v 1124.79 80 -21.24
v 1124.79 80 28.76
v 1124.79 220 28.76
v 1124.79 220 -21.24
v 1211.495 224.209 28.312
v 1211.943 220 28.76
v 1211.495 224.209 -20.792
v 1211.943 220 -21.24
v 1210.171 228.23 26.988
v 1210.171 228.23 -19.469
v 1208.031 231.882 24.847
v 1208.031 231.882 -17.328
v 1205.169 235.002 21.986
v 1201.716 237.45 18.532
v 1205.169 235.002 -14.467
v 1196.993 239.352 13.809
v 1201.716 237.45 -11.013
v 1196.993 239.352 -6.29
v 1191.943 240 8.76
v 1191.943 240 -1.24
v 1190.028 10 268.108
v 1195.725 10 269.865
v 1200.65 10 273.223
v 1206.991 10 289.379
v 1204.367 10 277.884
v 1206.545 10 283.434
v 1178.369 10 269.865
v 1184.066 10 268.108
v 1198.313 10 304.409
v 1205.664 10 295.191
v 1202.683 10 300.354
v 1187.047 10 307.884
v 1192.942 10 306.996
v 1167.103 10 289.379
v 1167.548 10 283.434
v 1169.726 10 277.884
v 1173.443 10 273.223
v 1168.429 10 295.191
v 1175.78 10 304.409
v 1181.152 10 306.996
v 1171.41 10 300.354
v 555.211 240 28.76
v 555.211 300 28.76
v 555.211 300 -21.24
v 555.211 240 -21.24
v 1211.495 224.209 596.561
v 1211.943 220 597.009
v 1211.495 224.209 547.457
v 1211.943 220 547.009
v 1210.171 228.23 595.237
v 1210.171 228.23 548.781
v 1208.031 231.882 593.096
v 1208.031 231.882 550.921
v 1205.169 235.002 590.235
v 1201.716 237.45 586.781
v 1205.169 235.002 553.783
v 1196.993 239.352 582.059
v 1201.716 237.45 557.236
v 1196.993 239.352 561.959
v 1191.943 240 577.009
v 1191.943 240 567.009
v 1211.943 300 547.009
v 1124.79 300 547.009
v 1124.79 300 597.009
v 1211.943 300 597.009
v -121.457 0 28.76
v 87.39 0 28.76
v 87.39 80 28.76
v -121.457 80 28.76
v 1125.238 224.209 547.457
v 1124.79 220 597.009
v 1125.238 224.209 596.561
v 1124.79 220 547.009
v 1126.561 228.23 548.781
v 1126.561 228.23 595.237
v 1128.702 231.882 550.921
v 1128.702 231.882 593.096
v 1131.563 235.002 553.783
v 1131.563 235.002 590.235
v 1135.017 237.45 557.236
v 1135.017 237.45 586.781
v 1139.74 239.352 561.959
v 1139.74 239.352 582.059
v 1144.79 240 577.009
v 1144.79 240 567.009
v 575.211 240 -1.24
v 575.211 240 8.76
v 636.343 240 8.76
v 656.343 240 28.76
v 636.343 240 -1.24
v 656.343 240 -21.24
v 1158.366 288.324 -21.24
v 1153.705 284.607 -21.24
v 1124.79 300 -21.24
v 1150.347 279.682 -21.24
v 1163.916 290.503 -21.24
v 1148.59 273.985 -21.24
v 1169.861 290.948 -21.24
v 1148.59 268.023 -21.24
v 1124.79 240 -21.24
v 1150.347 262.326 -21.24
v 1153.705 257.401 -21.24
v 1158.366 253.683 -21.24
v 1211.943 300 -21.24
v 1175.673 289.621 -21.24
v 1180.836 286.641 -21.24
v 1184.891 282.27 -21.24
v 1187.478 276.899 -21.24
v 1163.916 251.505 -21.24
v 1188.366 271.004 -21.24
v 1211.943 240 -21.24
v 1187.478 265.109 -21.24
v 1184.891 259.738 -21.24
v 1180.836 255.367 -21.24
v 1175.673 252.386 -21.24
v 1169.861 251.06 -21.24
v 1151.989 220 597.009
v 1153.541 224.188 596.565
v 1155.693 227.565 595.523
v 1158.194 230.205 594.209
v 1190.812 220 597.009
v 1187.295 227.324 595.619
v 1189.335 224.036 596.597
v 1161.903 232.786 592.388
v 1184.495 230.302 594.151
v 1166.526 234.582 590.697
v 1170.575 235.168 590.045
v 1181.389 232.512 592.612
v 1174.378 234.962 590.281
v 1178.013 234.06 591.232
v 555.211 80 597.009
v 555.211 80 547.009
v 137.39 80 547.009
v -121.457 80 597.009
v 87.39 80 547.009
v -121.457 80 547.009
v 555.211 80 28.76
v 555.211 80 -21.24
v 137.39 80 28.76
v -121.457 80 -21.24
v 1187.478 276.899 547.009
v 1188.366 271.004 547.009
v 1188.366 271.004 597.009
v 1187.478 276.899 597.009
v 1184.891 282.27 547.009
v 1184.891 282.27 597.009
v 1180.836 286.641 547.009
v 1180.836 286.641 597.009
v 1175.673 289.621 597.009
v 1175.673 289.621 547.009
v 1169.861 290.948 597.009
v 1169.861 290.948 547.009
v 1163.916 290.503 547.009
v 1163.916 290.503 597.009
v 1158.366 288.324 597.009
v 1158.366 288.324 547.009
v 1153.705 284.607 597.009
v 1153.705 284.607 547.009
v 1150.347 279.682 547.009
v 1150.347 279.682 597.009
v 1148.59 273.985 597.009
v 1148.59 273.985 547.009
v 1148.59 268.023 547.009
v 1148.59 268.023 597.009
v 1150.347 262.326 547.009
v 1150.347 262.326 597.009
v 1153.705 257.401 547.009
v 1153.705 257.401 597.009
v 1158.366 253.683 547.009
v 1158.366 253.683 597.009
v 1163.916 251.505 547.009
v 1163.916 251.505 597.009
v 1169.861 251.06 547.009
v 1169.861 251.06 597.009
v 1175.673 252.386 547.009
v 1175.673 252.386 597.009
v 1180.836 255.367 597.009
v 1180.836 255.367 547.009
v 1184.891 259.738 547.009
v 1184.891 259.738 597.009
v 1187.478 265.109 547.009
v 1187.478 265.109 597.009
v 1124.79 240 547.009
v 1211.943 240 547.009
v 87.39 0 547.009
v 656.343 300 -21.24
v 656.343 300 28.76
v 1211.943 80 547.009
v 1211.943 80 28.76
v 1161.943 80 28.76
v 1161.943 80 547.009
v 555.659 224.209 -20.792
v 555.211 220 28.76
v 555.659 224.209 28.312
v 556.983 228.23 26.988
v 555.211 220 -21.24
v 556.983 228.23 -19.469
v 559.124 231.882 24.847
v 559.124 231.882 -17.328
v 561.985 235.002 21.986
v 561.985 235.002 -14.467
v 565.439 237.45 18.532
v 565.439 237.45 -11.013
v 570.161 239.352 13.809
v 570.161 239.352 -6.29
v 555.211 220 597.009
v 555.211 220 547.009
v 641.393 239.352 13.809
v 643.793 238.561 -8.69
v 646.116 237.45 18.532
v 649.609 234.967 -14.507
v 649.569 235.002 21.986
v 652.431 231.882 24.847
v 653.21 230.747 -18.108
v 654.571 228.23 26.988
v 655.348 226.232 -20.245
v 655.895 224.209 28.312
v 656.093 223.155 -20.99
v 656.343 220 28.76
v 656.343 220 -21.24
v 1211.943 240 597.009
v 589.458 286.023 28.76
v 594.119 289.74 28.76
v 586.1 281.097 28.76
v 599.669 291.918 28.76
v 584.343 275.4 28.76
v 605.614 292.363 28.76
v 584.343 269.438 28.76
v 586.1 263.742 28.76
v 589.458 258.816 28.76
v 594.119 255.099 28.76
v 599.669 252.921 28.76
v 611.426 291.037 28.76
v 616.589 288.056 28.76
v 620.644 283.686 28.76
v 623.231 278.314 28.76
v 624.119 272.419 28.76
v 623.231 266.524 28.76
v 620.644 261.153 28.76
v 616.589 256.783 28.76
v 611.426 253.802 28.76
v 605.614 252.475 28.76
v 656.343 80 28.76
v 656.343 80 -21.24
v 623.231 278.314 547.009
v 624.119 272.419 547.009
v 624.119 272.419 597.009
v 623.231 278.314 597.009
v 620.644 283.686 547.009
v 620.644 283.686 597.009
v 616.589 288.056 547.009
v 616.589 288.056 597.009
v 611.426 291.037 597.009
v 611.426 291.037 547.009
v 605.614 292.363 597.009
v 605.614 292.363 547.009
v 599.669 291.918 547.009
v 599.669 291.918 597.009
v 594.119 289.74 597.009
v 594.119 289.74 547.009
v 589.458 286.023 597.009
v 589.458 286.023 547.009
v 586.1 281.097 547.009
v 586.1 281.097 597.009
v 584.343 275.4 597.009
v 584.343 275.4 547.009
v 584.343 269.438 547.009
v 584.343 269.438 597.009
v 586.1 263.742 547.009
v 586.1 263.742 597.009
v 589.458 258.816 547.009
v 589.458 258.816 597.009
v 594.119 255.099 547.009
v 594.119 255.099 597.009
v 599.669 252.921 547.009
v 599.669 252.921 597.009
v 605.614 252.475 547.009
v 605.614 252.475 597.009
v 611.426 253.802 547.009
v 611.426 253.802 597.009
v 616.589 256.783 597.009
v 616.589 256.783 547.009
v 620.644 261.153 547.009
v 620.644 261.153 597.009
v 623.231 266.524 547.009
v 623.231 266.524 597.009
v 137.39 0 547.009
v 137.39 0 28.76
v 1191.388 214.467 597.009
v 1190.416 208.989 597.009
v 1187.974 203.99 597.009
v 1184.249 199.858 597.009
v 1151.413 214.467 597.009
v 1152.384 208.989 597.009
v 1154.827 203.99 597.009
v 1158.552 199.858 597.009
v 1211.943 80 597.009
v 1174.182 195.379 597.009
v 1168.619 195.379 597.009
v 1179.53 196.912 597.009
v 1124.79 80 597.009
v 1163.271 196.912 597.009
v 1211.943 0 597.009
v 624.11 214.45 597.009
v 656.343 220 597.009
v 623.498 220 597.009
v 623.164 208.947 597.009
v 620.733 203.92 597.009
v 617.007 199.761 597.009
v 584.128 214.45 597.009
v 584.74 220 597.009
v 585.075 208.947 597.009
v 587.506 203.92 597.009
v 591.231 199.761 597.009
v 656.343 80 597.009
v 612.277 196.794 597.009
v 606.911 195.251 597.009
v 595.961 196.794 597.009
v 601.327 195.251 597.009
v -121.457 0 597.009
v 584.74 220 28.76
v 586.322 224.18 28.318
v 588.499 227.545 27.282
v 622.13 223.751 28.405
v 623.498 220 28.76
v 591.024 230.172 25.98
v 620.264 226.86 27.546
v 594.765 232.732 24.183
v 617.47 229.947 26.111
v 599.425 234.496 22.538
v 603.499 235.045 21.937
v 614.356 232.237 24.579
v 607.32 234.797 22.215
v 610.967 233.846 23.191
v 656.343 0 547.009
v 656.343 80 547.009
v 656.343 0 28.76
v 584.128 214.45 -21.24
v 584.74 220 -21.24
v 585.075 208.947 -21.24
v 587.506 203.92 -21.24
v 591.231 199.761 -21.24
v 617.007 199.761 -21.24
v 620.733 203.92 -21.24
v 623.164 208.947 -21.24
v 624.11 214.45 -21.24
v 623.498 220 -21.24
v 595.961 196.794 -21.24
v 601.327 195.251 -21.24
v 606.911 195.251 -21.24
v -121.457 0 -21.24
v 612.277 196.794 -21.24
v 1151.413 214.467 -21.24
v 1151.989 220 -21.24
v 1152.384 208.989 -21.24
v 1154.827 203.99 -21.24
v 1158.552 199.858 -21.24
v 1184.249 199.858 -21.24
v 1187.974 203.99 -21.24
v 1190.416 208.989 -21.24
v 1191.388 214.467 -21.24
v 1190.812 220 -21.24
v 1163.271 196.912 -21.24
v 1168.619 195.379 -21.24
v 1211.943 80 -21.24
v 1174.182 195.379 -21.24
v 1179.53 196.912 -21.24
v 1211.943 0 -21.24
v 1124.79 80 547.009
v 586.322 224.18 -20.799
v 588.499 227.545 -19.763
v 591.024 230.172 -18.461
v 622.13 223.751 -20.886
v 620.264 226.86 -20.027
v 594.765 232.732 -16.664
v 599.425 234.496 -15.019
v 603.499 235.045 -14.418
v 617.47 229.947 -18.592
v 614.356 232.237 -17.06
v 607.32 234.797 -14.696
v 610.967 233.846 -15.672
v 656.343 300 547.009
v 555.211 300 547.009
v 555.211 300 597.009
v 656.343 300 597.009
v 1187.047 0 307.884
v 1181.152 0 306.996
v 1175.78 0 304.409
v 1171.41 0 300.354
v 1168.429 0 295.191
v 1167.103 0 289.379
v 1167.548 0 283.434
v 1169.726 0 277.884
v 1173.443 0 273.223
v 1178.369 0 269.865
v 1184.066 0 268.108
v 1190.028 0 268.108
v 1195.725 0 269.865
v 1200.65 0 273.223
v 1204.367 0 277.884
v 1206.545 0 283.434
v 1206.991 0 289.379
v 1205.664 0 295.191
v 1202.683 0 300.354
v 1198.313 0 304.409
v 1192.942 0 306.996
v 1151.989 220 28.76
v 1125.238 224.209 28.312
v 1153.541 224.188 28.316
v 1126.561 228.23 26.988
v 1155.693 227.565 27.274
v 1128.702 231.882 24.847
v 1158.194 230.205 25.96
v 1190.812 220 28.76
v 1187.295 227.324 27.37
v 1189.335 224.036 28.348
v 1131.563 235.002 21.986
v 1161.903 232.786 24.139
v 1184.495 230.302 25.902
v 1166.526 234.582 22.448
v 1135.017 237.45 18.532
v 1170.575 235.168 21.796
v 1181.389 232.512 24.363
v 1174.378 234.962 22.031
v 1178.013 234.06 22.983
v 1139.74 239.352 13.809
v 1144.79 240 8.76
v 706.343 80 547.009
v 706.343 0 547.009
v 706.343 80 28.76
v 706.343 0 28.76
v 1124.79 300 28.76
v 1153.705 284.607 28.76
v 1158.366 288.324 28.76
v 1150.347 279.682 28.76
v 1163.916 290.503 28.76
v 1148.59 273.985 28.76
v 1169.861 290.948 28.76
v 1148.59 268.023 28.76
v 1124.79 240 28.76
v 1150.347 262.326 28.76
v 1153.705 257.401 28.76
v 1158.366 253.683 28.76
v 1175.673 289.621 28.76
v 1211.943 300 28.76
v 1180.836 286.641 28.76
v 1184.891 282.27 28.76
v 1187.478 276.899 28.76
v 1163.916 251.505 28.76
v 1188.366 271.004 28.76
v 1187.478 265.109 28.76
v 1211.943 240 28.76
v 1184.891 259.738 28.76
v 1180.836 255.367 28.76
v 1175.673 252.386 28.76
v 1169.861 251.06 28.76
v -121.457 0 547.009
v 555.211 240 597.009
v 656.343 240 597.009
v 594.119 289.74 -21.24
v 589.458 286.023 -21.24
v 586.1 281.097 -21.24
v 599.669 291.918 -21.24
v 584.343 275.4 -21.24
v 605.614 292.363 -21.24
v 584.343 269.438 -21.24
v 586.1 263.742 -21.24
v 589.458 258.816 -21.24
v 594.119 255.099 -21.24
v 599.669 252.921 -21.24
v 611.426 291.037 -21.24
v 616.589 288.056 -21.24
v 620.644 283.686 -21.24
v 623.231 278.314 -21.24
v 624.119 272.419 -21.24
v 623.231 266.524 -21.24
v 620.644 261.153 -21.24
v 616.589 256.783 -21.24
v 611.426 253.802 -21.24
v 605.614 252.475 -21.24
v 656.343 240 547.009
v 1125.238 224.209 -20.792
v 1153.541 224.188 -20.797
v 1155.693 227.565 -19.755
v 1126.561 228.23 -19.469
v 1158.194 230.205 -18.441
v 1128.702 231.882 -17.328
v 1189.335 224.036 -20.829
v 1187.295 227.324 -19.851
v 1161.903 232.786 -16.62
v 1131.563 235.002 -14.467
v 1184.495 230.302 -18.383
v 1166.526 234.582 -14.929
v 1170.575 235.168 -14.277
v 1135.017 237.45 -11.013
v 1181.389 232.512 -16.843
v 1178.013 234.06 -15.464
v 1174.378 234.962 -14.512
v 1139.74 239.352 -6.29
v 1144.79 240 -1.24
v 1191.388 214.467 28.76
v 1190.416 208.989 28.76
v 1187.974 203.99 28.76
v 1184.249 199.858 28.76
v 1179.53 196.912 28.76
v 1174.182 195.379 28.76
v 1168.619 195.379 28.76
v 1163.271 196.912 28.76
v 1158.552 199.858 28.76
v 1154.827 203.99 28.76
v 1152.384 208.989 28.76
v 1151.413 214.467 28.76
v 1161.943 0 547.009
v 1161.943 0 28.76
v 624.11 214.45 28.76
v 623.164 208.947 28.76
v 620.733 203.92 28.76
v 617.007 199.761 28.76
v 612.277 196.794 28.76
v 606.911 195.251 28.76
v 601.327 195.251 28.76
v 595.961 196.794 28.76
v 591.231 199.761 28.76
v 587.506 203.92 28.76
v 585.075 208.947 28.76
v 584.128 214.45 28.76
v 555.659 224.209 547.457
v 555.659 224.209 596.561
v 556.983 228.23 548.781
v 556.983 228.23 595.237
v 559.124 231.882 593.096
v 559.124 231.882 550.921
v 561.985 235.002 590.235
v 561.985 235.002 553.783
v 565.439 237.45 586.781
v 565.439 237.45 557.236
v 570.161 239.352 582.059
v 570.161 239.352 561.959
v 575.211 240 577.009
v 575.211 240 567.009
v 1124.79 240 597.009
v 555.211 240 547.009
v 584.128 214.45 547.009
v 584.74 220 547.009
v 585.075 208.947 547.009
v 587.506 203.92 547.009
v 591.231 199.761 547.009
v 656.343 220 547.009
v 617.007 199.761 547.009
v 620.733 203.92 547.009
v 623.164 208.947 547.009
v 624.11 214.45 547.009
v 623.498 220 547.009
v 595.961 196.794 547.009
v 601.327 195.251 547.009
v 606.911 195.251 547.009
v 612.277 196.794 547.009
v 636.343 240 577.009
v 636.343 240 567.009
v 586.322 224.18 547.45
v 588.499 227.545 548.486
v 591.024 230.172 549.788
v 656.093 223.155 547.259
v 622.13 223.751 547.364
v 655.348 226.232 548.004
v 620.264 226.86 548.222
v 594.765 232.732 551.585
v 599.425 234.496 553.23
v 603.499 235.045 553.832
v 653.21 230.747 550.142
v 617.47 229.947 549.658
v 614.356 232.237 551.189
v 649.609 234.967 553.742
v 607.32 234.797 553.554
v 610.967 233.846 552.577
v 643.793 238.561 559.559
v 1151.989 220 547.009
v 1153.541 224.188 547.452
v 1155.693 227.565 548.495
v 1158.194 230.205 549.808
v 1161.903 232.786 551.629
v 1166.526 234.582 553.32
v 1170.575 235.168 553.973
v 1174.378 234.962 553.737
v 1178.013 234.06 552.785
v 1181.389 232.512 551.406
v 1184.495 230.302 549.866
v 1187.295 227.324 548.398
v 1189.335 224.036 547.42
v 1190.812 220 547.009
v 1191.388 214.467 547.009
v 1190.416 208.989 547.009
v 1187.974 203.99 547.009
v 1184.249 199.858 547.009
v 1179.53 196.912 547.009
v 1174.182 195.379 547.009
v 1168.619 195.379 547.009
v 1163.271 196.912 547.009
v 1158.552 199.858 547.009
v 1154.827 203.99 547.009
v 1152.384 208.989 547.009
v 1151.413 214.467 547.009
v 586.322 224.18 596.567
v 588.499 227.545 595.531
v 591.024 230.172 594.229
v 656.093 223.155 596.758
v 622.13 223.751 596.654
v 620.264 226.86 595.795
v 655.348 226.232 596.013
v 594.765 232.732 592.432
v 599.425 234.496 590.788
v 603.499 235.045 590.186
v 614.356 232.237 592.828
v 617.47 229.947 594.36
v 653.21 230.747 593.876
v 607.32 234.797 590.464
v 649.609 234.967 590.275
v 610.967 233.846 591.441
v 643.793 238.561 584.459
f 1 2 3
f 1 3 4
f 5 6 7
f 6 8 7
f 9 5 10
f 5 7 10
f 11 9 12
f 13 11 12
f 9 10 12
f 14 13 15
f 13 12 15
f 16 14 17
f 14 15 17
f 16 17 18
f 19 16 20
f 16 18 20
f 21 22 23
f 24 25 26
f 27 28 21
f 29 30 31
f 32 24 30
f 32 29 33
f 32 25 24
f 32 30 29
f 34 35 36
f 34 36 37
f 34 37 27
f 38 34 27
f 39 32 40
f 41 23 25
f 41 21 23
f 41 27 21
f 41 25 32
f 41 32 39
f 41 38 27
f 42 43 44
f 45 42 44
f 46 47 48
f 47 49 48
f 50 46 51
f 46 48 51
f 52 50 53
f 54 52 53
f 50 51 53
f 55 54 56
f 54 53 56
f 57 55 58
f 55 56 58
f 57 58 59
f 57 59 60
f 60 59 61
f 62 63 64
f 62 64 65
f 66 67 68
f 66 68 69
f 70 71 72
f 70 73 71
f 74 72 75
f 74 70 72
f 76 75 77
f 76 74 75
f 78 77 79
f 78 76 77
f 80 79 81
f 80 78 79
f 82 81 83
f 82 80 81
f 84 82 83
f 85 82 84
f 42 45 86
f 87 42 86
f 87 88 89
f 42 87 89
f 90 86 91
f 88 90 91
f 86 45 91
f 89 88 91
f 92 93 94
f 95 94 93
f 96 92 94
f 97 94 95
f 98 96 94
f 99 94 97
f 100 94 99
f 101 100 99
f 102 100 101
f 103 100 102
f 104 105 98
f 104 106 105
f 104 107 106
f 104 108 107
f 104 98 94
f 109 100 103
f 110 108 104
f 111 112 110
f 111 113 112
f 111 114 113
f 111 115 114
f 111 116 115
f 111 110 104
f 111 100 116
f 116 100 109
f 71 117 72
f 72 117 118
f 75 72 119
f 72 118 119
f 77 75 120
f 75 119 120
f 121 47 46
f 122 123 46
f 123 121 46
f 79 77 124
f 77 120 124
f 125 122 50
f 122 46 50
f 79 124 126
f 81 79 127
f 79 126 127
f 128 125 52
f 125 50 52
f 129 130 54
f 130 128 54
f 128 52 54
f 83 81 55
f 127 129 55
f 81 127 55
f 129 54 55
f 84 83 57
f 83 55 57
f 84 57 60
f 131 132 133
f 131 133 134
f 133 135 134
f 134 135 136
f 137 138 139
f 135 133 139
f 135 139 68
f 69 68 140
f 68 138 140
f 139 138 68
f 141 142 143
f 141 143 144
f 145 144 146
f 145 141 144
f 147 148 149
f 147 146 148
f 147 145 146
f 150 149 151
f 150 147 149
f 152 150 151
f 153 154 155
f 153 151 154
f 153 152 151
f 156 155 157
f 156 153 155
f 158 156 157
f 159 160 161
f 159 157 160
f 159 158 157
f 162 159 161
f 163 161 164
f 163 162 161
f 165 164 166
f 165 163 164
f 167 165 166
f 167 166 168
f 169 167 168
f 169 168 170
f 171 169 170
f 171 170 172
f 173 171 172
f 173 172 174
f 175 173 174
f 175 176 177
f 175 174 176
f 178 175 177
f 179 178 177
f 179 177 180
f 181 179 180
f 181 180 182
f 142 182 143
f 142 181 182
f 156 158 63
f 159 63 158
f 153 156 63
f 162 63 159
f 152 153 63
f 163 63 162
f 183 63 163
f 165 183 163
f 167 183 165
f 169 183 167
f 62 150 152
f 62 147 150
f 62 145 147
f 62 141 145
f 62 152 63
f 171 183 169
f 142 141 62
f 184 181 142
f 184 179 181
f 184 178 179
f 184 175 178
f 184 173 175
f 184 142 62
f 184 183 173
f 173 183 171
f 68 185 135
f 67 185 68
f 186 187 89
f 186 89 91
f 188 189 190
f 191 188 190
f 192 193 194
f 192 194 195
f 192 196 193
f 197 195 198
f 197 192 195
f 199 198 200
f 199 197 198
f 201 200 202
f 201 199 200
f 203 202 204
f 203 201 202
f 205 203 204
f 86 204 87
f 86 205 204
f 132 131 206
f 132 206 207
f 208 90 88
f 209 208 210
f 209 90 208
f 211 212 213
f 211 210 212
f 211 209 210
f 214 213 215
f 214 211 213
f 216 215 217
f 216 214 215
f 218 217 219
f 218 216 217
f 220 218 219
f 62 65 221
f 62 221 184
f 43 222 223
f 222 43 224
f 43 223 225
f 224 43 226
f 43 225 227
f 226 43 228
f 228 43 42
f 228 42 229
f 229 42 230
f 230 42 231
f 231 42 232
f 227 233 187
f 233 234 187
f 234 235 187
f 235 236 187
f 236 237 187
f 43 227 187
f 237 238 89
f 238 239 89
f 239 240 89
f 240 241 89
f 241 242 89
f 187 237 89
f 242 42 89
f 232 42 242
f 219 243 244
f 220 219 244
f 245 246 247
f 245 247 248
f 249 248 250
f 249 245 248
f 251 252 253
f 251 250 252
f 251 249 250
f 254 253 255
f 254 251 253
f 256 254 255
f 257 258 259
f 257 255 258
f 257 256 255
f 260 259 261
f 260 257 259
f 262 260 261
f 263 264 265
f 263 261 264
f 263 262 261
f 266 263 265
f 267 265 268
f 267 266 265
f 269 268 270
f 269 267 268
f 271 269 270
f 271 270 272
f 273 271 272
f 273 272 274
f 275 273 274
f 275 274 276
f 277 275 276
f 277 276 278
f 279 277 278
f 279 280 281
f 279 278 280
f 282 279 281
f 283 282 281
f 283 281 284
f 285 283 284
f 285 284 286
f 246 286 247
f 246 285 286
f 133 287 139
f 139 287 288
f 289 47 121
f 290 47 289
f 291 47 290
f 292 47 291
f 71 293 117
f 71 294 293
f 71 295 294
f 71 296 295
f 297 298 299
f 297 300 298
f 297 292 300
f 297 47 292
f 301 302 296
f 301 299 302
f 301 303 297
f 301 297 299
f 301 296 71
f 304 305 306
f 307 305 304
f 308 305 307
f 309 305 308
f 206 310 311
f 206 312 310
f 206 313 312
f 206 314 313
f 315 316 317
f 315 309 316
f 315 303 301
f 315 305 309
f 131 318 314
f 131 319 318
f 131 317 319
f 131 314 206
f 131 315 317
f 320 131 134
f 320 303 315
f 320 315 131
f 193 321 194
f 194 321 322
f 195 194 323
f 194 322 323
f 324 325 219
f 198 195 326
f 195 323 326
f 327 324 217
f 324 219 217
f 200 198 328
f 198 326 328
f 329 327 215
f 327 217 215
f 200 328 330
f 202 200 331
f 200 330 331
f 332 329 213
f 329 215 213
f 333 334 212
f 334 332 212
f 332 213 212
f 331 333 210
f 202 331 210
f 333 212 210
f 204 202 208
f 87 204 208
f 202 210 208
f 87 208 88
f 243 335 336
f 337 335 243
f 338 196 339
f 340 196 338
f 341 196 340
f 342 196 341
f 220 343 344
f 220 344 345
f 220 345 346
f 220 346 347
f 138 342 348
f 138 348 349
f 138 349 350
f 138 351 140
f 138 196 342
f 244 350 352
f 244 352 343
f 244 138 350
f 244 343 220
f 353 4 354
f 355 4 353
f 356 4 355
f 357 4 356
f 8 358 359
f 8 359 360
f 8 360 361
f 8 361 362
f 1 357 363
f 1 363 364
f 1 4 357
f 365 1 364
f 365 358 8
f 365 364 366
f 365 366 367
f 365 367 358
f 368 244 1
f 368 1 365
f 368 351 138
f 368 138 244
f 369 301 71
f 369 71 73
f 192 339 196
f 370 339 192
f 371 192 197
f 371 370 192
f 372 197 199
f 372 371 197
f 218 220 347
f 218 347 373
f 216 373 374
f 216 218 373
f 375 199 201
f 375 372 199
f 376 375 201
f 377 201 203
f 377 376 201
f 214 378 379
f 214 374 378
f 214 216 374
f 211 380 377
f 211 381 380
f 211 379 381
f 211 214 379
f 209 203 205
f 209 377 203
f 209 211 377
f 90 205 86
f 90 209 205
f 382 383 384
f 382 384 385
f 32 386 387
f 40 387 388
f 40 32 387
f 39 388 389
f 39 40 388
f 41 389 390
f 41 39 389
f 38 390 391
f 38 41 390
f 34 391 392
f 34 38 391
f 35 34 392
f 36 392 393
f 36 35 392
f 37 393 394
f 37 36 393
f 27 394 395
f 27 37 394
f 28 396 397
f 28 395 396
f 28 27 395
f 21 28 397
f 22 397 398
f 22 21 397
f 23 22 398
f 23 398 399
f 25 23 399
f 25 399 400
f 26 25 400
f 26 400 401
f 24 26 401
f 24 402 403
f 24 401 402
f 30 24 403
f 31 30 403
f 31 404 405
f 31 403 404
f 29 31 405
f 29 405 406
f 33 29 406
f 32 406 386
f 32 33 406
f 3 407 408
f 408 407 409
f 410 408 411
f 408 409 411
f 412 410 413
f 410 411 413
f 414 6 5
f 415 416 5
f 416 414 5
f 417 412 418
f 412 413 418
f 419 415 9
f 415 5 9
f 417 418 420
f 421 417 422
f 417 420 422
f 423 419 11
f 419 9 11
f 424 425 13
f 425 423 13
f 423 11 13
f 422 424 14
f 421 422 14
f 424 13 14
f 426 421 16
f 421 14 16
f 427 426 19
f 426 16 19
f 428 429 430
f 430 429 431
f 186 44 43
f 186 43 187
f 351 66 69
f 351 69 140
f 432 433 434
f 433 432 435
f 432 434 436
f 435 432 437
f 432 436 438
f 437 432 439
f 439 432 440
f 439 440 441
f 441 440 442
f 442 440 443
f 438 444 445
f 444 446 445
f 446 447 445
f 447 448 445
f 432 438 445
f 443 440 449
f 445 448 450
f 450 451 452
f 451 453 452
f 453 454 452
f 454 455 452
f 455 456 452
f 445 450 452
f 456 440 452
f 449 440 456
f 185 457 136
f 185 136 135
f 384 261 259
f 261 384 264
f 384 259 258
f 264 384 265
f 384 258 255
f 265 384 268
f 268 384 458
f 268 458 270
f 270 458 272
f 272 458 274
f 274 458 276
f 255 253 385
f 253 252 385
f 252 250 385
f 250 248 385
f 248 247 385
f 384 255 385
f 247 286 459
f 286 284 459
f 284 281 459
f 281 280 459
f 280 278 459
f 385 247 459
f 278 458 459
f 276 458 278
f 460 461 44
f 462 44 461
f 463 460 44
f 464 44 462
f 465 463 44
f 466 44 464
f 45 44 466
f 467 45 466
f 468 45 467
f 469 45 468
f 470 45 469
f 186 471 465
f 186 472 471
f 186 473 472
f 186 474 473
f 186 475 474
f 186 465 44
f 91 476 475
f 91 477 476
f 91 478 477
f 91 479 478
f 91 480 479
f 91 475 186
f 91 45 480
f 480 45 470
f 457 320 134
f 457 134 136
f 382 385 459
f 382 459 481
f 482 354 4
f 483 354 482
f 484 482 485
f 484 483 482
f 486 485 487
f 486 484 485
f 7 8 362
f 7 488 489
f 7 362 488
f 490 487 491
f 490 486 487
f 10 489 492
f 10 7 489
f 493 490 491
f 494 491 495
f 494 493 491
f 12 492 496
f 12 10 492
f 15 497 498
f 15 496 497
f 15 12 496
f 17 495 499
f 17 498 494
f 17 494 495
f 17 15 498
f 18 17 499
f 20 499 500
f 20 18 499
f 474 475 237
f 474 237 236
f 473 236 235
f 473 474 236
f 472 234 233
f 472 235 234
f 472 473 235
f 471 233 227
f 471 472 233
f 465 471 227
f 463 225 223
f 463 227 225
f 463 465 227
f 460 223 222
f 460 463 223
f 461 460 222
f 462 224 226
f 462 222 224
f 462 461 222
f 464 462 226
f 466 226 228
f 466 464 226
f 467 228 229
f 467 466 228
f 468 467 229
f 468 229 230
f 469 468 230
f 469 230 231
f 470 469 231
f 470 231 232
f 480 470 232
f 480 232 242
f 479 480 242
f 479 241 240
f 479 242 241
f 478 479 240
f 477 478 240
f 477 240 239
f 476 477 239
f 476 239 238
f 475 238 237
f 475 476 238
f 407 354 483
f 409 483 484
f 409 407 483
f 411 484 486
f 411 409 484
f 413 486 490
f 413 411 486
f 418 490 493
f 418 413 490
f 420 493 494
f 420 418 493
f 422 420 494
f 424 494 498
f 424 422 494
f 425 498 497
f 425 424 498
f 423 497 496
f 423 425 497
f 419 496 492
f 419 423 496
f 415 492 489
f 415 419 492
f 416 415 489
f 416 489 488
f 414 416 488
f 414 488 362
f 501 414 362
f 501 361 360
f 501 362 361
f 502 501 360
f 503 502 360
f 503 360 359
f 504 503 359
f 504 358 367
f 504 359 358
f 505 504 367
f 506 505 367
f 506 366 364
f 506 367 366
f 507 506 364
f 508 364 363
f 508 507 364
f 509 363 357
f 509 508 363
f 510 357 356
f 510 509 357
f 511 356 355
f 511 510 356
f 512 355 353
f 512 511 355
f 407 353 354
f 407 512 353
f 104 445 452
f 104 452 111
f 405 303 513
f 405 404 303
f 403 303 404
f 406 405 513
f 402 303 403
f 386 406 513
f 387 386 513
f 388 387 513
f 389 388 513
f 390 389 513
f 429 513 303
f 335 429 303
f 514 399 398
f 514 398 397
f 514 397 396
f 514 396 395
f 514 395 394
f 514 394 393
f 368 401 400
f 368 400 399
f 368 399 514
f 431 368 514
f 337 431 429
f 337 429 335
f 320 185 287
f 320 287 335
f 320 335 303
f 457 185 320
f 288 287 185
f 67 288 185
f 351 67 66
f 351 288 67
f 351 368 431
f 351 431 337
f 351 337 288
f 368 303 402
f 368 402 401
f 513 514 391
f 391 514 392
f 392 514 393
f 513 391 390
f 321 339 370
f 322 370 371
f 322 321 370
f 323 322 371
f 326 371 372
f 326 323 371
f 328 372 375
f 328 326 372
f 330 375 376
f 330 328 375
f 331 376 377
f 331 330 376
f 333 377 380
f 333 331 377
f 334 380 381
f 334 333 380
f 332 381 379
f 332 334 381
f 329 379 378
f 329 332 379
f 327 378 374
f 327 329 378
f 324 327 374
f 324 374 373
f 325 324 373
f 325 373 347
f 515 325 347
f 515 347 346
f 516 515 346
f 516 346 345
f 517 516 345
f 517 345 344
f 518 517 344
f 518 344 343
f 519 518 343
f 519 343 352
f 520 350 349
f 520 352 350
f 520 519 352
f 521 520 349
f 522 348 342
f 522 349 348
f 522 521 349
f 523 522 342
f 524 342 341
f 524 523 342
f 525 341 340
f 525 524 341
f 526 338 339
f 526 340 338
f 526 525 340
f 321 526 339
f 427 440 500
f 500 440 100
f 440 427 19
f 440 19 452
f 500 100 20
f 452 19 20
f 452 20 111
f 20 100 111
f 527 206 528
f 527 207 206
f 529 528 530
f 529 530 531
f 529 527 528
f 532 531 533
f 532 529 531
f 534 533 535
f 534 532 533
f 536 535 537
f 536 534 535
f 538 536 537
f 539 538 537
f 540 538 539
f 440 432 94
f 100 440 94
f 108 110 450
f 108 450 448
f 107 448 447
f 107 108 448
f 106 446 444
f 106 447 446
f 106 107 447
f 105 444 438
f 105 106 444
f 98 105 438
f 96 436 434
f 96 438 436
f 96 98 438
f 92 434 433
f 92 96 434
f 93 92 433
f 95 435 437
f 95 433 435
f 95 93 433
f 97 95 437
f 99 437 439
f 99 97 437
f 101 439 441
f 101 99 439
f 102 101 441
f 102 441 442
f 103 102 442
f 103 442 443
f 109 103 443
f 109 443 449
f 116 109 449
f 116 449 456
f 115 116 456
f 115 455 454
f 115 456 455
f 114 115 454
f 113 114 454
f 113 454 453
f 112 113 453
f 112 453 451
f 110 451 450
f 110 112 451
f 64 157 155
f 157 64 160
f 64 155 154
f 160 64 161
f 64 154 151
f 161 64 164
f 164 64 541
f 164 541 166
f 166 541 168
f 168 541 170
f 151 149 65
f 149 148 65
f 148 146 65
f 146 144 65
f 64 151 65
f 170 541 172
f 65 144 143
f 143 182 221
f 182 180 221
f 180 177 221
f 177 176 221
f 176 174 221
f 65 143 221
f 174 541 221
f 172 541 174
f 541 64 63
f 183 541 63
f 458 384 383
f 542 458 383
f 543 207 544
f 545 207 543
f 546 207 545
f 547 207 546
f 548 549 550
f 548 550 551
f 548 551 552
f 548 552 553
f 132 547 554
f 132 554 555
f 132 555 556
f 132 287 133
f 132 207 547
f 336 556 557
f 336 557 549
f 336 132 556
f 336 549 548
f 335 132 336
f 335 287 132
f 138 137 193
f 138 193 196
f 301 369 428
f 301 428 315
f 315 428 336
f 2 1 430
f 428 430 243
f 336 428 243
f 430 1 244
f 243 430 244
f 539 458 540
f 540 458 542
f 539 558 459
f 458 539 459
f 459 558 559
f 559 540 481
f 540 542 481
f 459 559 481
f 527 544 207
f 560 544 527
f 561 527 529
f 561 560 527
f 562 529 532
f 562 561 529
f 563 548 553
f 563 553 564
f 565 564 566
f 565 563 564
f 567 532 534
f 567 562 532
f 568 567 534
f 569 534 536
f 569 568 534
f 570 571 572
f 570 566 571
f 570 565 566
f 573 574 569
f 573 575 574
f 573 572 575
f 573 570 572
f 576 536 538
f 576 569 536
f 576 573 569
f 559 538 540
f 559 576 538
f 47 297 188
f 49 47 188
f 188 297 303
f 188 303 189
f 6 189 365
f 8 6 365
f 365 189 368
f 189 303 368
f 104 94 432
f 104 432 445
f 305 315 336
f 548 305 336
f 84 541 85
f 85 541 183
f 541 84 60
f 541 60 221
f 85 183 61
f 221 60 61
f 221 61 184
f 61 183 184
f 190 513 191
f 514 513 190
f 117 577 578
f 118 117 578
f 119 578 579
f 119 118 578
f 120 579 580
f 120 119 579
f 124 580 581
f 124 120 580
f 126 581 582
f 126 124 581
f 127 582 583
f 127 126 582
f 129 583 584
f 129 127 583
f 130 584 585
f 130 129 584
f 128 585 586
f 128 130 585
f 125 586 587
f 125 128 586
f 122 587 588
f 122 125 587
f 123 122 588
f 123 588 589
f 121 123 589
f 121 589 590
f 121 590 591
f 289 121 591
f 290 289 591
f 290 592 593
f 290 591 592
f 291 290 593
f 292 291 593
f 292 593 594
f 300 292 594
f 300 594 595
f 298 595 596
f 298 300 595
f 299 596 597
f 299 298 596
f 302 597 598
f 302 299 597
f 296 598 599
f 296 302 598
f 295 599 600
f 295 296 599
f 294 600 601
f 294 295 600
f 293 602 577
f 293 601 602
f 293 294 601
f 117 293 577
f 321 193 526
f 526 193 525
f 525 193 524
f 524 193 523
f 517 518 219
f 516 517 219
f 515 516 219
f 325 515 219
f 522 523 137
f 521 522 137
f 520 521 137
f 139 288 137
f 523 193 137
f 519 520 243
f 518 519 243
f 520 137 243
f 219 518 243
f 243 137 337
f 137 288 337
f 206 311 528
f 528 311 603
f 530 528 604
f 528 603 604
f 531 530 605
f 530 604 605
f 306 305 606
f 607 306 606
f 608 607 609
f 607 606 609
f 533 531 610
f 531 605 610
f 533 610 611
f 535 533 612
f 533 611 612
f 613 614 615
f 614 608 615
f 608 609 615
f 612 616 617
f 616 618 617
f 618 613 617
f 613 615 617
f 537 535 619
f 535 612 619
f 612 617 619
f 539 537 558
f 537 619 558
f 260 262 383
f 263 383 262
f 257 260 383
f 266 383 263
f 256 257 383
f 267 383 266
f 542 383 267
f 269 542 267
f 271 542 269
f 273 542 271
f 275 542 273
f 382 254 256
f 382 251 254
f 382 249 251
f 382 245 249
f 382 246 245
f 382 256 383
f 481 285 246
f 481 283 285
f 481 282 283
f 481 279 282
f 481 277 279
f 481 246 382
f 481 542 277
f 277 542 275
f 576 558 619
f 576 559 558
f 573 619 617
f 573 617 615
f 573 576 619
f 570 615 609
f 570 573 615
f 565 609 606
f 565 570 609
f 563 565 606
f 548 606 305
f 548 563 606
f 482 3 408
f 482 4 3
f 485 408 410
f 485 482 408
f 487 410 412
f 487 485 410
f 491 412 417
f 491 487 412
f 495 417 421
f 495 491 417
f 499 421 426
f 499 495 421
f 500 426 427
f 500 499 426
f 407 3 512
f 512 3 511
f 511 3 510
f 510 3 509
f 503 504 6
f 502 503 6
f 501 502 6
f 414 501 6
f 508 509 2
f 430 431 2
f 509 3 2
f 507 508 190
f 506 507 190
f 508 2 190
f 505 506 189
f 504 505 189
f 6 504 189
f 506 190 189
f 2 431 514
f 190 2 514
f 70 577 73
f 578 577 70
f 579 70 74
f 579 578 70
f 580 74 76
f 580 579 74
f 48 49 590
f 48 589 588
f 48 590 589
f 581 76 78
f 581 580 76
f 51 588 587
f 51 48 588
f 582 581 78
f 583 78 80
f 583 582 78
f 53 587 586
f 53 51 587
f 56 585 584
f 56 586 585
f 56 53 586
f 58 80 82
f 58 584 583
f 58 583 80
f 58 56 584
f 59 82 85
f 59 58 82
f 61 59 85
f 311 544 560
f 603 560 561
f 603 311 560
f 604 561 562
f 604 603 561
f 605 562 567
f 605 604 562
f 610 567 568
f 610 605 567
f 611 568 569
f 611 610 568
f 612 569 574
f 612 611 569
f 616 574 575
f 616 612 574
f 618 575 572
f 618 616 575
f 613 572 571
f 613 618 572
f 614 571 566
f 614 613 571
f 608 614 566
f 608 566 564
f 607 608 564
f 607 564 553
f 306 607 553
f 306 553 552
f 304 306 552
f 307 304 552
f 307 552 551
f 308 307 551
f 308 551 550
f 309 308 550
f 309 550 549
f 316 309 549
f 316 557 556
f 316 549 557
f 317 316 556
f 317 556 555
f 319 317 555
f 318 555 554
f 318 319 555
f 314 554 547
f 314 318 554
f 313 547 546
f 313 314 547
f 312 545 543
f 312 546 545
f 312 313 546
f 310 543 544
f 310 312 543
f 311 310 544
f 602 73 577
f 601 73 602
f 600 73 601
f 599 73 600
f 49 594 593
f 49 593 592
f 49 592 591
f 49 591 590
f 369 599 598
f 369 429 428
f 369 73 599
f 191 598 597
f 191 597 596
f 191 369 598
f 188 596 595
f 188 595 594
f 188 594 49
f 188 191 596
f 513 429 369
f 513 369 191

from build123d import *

# Parameters (mm, degrees)
SKETCH1_W               = 518.953439809
SKETCH1_H               = 518.249184403
SKETCH1_W_2             = 455.6
BOSS_EXTRUDE3_DEPTH     = 80
SKETCH2_W               = 101.131848524
SKETCH2_H               = 50
SKETCH2_W_2             = 87.153604081
BOSS_EXTRUDE4_DEPTH     = 160
FILLET1_R               = 20
CUT_EXTRUDE3_DEPTH      = 1373.160931607
CUT_EXTRUDE3_DEPTH_BACK = 10
SKETCH5_R               = 20
CUT_EXTRUDE4_DEPTH      = 1382.534741242
CUT_EXTRUDE4_DEPTH_BACK = 1382.534741242
SKETCH3_R               = 20
CUT_EXTRUDE5_DEPTH      = 1382.534741304
CUT_EXTRUDE5_DEPTH_BACK = 1382.534741304
SKETCH4_R               = 20
SKETCH6_W               = 101.131848524
SKETCH6_H               = 50
BOSS_EXTRUDE5_DEPTH     = 60
CUT_EXTRUDE6_DEPTH      = 1394.211484888
CUT_EXTRUDE6_DEPTH_BACK = 1394.211484888
SKETCH7_R               = 20
SKETCH8_W               = 87.153604081
SKETCH8_H               = 50
BOSS_EXTRUDE6_DEPTH     = 60
CUT_EXTRUDE7_DEPTH      = 1394.211484888
CUT_EXTRUDE7_DEPTH_BACK = 1394.211484888
SKETCH9_R               = 20


with BuildPart() as part:
    # Sketch1 → Boss-Extrude3 (new body)
    with BuildSketch(Plane(origin=(0, 0, 0), x_dir=(1, 0, 0), z_dir=(0, 1, 0))):
        Polygon((-121.456854781, 21.240444949), (1211.943145219, 21.240444949), (1211.943145219, -50.701004169), (1211.943145219, -568.950188572), (1211.943145219, -597.008739454), (-121.456854781, -597.008739454), (-121.456854781, -547.008739454), (87.38970541, -547.008739454), (87.38970541, -28.759555051), (-121.456854781, -28.759555051), align=None)
        with Locations((396.866425315, -287.884147253)):
            Rectangle(SKETCH1_W, SKETCH1_H, mode=Mode.SUBTRACT)
        with Locations((934.143145219, -287.884147253)):
            Rectangle(SKETCH1_W_2, SKETCH1_H, mode=Mode.SUBTRACT)
    extrude(amount=BOSS_EXTRUDE3_DEPTH)

    # Sketch2 → Boss-Extrude4 (add)
    with BuildSketch(Plane(origin=(0, 80, 0), x_dir=(1, 0, 0), z_dir=(0, 1, 0))):
        with Locations((605.777220957, -3.759555051)):
            Rectangle(SKETCH2_W, SKETCH2_H)
        with Locations((1168.366343179, -3.759555051)):
            Rectangle(SKETCH2_W_2, SKETCH2_H)
        with Locations((605.777220957, -572.008739454)):
            Rectangle(SKETCH2_W, SKETCH2_H)
        with Locations((1168.366343179, -572.008739454)):
            Rectangle(SKETCH2_W_2, SKETCH2_H)
    extrude(amount=BOSS_EXTRUDE4_DEPTH)

    # Fillet1
    fillet1_edges = [part.edges().sort_by_distance(p)[0] for p in [
        (656.343145219, 240, 572.008739454),
        (605.777220957, 240, 547.008739454),
        (555.211296695, 240, 572.008739454),
        (605.777220957, 240, 597.008739454),
        (1124.789541138, 240, 3.759555051),
        (1168.366343178, 240, 28.759555051),
        (1211.943145219, 240, 3.759555051),
        (1168.366343178, 240, -21.240444949),
        (1124.789541138, 240, 572.008739454),
        (1168.366343178, 240, 597.008739454),
        (1211.943145219, 240, 572.008739454),
        (1168.366343178, 240, 547.008739454),
        (555.211296695, 240, 3.759555051),
        (605.777220957, 240, 28.759555051),
        (656.343145219, 240, 3.759555051),
        (605.777220957, 240, -21.240444949),
    ]]
    fillet(fillet1_edges, radius=FILLET1_R)

    # Sketch5 → Cut-Extrude3 (cut, two sides: drawn at the far end of the back side and taken through both)
    with BuildSketch(Plane(origin=(0, 0, 0), x_dir=(-1, 0, 0), z_dir=(0, -1, 0)).offset(-CUT_EXTRUDE3_DEPTH_BACK)):
        with Locations(Location((-1187.046867592, -287.884147253, 0), (0, 0, 270))):
            Circle(SKETCH5_R)
    extrude(amount=CUT_EXTRUDE3_DEPTH + CUT_EXTRUDE3_DEPTH_BACK, mode=Mode.SUBTRACT)

    # Sketch3 → Cut-Extrude4 (cut, two sides: drawn at the far end of the back side and taken through both)
    with BuildSketch(Plane(origin=(0, 0, -21.240444949), x_dir=(-1, 0, 0), z_dir=(0, 0, -1)).offset(-CUT_EXTRUDE4_DEPTH_BACK)):
        with Locations(Location((-604.119324359, 215.055032995, 0), (0, 0, 14.314743265))):
            Circle(SKETCH3_R)
    extrude(amount=CUT_EXTRUDE4_DEPTH + CUT_EXTRUDE4_DEPTH_BACK, mode=Mode.SUBTRACT)

    # Sketch4 → Cut-Extrude5 (cut, two sides: drawn at the far end of the back side and taken through both)
    with BuildSketch(Plane(origin=(0, 0, -21.240444949), x_dir=(-1, 0, 0), z_dir=(0, 0, -1)).offset(-CUT_EXTRUDE5_DEPTH_BACK)):
        with Locations(Location((-1171.400402377, 215.184793276, 0), (0, 0, 13.931420355))):
            Circle(SKETCH4_R)
    extrude(amount=CUT_EXTRUDE5_DEPTH + CUT_EXTRUDE5_DEPTH_BACK, mode=Mode.SUBTRACT)

    # Sketch6 → Boss-Extrude5 (add)
    with BuildSketch(Plane(origin=(0, 240, 0), x_dir=(1, 0, 0), z_dir=(0, 1, 0))):
        with Locations((605.777220957, -3.759555051)):
            Rectangle(SKETCH6_W, SKETCH6_H)
        with Locations((605.777220957, -572.008739454)):
            Rectangle(SKETCH6_W, SKETCH6_H)
    extrude(amount=BOSS_EXTRUDE5_DEPTH)

    # Sketch7 → Cut-Extrude6 (cut, two sides: drawn at the far end of the back side and taken through both)
    with BuildSketch(Plane.XY.offset(597.008739454).offset(-CUT_EXTRUDE6_DEPTH_BACK)):
        with Locations((604.119324359, 272.419198887)):
            Circle(SKETCH7_R)
    extrude(amount=CUT_EXTRUDE6_DEPTH + CUT_EXTRUDE6_DEPTH_BACK, mode=Mode.SUBTRACT)

    # Sketch8 → Boss-Extrude6 (add)
    with BuildSketch(Plane(origin=(0, 240, 0), x_dir=(1, 0, 0), z_dir=(0, 1, 0))):
        with Locations((1168.366343179, -572.008739454)):
            Rectangle(SKETCH8_W, SKETCH8_H)
        with Locations((1168.366343179, -3.759555051)):
            Rectangle(SKETCH8_W, SKETCH8_H)
    extrude(amount=BOSS_EXTRUDE6_DEPTH)

    # Sketch9 → Cut-Extrude7 (cut, two sides: drawn at the far end of the back side and taken through both)
    with BuildSketch(Plane.XY.offset(597.008739454).offset(-CUT_EXTRUDE7_DEPTH_BACK)):
        with Locations((1168.366343178, 271.00396048)):
            Circle(SKETCH9_R)
    extrude(amount=CUT_EXTRUDE7_DEPTH + CUT_EXTRUDE7_DEPTH_BACK, mode=Mode.SUBTRACT)


solid = part.part
